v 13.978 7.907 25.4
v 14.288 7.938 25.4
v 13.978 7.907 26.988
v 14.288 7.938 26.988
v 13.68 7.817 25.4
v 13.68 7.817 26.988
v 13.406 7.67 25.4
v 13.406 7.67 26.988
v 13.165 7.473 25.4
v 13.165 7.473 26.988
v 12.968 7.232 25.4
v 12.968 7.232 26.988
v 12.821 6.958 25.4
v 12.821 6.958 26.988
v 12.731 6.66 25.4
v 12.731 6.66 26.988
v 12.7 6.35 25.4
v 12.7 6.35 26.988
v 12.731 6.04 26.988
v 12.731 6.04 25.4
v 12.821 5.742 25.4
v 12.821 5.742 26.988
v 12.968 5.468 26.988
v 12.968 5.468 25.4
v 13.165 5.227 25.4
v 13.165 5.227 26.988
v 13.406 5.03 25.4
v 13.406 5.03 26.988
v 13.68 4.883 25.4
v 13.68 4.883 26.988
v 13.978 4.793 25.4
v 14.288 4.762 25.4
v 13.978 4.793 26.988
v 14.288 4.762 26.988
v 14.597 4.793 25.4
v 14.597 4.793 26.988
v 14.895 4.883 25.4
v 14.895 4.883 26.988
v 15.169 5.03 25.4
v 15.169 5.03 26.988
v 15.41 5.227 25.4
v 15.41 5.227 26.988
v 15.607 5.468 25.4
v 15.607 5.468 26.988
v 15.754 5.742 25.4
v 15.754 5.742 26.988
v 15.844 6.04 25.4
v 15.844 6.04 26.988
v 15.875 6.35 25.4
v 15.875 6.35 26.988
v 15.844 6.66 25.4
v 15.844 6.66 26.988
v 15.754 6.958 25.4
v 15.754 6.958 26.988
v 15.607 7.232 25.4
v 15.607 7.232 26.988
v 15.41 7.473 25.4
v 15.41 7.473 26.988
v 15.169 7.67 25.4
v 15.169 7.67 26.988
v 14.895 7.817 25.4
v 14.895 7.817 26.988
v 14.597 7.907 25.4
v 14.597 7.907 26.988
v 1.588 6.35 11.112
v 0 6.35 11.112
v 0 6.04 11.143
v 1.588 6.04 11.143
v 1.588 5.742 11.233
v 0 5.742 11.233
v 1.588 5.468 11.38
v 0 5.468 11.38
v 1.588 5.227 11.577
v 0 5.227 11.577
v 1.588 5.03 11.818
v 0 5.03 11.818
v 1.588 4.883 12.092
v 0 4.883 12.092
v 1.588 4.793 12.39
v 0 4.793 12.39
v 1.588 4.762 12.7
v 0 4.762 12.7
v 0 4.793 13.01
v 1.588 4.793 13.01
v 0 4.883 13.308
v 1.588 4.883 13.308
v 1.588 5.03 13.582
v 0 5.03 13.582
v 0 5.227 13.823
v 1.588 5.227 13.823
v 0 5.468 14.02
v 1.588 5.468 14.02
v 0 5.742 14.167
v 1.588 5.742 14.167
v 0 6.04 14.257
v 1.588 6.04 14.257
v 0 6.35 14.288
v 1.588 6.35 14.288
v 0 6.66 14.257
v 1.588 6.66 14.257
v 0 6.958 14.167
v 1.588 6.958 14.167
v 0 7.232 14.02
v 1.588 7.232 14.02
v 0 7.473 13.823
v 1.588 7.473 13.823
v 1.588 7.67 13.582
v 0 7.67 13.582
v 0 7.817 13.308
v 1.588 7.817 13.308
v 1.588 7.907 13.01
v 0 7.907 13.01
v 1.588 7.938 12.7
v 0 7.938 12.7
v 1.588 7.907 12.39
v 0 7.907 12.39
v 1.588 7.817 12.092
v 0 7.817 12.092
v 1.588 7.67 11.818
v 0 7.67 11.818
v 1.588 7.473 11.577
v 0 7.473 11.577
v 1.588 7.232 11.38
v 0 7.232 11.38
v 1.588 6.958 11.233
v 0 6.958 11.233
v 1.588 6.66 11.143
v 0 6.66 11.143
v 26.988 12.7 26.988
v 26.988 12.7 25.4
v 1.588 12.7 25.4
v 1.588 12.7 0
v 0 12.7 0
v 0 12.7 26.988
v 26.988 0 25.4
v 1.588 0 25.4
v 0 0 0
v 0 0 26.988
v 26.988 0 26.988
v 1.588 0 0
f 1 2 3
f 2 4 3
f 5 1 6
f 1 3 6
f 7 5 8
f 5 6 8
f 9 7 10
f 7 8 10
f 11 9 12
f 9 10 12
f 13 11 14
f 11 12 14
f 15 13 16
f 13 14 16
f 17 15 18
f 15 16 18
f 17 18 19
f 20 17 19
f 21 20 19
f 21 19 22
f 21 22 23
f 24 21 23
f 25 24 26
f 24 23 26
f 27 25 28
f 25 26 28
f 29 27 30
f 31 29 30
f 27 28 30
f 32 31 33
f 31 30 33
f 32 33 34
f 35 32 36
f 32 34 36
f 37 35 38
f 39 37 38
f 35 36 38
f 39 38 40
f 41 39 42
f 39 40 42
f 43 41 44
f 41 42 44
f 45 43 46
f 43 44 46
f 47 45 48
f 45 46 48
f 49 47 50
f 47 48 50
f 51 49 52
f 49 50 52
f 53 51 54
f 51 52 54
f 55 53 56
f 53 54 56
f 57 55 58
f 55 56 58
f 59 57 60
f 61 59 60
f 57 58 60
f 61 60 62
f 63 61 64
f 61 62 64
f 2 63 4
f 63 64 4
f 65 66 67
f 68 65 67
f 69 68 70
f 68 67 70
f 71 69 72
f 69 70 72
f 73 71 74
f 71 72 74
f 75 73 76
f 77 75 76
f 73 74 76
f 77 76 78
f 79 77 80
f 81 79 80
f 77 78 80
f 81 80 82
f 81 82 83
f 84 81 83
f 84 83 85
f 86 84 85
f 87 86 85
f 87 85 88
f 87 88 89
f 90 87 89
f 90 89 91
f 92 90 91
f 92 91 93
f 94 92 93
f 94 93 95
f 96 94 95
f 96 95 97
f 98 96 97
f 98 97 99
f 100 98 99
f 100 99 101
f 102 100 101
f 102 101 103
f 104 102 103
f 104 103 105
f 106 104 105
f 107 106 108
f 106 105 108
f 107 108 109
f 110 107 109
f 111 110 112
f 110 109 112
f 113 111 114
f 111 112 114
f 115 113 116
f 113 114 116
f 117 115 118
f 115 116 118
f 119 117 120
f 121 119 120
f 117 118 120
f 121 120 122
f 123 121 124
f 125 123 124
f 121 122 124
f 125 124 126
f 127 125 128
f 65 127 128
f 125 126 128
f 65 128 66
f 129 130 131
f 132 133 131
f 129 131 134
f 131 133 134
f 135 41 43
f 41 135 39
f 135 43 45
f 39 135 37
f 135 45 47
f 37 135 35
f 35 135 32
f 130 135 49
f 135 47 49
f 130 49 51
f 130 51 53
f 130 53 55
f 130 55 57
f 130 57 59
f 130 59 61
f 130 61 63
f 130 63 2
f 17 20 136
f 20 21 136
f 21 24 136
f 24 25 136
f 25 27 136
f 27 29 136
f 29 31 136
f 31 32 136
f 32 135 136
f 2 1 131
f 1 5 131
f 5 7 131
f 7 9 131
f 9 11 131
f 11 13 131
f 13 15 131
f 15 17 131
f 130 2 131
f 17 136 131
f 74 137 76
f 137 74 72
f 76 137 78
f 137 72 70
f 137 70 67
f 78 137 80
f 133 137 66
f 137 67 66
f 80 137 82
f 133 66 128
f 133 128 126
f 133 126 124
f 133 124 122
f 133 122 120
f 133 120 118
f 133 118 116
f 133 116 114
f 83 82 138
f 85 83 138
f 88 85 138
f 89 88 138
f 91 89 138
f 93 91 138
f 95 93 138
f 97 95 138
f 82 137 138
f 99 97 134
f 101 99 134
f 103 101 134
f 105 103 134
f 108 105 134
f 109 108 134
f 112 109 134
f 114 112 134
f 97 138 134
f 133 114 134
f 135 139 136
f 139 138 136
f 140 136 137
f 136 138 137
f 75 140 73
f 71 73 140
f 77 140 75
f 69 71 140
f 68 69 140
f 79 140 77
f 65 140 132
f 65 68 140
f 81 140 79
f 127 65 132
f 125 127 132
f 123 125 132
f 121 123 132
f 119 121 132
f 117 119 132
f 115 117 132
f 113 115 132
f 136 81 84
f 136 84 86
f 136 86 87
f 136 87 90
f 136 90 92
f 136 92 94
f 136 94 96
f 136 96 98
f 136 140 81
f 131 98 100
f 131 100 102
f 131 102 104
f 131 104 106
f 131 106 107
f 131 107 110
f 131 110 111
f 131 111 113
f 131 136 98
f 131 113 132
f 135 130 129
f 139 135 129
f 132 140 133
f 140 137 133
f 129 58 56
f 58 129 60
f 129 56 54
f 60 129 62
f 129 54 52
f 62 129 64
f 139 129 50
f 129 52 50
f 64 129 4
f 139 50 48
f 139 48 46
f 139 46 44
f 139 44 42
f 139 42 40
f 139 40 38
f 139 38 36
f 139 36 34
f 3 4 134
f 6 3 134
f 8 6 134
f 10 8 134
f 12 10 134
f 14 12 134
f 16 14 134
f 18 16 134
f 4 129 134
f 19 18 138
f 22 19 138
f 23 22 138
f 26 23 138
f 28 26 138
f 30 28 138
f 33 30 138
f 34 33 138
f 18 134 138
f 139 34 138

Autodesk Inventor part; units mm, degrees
ref_plane "YZ Plane" through (0, 0, 0) normal (1, 0, 0) x (0, 1, 0)
ref_plane "XZ Plane" through (0, 0, 0) normal (0, 1, 0) x (-1, 0, 0)
ref_plane "XY Plane" through (0, 0, 0) normal (0, 0, 1) x (1, 0, 0)
sketch "Sketch1" plane through (0, 0, 0) normal (1, 0, 0) x (0, 1, 0)
  line L0 (0, 0) -> (12.7, 0)
  line L1 (12.7, 0) -> (12.7, 25.4)
  line L2 (12.7, 25.4) -> (0, 25.4)
  line L3 (0, 25.4) -> (0, 0)
  dimension "d0" = 25.4
  dimension "d1" = 12.7
extrude "Extrusion1" add sketch "Sketch1" along normal blind 1.5875
sketch "Sketch2" plane through (1.5875, 0, 0) normal (1, 0, 0) x (0, 0, -1)
  line L0 (0, 0) -> (0, 12.7) projected
  line L1 (0, 12.7) -> (-25.4, 12.7) projected
  line L2 (-25.4, 12.7) -> (-25.4, 0) projected
  line L3 (-25.4, 0) -> (0, 0) projected
sketch "Sketch3" plane through (0, 0, 0) normal (-1, 0, 0) x (0, 0, 1)
  line L0 (25.4, 12.7) -> (26.9875, 12.7)
  line L1 (26.9875, 12.7) -> (26.9875, 0)
  line L2 (26.9875, 0) -> (25.4, 0)
  line L3 (25.4, 0) -> (25.4, 12.7)
  dimension "d4" = 1.5875
extrude "Extrusion2" add sketch "Sketch3" against normal blind 26.9875
sketch "Sketch4" plane through (1.5875, 0, 0) normal (1, 0, 0) x (0, 0, -1)
  line L0 (0, 0) -> (0, 12.7) projected
  line L1 (-25.4, 0) -> (0, 0) projected
  point P0 (-12.7, 6.35)
  dimension "d8" = 6.35
  dimension "d9" = 12.7
sketch "Sketch5" plane through (26.9875, 12.7, 25.4) normal (0, 0, -1) x (-1, 0, 0)
  line L0 (0, -12.7) -> (0, 0) projected
  line L1 (25.4, -12.7) -> (0, -12.7) projected
  point P0 (26.9875, -12.7)
  point P1 (12.7, -6.35)
  dimension "d10" = 6.35
  dimension "d11" = 12.7
hole "Hole1" at (14.2875, 6.35, 25.4) direction (0, 0, 1) diameter 3.175 depth 25.4 tip angle 118
hole "Hole2" at (1.5875, 6.35, 12.7) direction (-1, 0, 0) diameter 3.175 depth 25.4 tip angle 118
properties part number "SideSupport" material "Aluminum 6061"
